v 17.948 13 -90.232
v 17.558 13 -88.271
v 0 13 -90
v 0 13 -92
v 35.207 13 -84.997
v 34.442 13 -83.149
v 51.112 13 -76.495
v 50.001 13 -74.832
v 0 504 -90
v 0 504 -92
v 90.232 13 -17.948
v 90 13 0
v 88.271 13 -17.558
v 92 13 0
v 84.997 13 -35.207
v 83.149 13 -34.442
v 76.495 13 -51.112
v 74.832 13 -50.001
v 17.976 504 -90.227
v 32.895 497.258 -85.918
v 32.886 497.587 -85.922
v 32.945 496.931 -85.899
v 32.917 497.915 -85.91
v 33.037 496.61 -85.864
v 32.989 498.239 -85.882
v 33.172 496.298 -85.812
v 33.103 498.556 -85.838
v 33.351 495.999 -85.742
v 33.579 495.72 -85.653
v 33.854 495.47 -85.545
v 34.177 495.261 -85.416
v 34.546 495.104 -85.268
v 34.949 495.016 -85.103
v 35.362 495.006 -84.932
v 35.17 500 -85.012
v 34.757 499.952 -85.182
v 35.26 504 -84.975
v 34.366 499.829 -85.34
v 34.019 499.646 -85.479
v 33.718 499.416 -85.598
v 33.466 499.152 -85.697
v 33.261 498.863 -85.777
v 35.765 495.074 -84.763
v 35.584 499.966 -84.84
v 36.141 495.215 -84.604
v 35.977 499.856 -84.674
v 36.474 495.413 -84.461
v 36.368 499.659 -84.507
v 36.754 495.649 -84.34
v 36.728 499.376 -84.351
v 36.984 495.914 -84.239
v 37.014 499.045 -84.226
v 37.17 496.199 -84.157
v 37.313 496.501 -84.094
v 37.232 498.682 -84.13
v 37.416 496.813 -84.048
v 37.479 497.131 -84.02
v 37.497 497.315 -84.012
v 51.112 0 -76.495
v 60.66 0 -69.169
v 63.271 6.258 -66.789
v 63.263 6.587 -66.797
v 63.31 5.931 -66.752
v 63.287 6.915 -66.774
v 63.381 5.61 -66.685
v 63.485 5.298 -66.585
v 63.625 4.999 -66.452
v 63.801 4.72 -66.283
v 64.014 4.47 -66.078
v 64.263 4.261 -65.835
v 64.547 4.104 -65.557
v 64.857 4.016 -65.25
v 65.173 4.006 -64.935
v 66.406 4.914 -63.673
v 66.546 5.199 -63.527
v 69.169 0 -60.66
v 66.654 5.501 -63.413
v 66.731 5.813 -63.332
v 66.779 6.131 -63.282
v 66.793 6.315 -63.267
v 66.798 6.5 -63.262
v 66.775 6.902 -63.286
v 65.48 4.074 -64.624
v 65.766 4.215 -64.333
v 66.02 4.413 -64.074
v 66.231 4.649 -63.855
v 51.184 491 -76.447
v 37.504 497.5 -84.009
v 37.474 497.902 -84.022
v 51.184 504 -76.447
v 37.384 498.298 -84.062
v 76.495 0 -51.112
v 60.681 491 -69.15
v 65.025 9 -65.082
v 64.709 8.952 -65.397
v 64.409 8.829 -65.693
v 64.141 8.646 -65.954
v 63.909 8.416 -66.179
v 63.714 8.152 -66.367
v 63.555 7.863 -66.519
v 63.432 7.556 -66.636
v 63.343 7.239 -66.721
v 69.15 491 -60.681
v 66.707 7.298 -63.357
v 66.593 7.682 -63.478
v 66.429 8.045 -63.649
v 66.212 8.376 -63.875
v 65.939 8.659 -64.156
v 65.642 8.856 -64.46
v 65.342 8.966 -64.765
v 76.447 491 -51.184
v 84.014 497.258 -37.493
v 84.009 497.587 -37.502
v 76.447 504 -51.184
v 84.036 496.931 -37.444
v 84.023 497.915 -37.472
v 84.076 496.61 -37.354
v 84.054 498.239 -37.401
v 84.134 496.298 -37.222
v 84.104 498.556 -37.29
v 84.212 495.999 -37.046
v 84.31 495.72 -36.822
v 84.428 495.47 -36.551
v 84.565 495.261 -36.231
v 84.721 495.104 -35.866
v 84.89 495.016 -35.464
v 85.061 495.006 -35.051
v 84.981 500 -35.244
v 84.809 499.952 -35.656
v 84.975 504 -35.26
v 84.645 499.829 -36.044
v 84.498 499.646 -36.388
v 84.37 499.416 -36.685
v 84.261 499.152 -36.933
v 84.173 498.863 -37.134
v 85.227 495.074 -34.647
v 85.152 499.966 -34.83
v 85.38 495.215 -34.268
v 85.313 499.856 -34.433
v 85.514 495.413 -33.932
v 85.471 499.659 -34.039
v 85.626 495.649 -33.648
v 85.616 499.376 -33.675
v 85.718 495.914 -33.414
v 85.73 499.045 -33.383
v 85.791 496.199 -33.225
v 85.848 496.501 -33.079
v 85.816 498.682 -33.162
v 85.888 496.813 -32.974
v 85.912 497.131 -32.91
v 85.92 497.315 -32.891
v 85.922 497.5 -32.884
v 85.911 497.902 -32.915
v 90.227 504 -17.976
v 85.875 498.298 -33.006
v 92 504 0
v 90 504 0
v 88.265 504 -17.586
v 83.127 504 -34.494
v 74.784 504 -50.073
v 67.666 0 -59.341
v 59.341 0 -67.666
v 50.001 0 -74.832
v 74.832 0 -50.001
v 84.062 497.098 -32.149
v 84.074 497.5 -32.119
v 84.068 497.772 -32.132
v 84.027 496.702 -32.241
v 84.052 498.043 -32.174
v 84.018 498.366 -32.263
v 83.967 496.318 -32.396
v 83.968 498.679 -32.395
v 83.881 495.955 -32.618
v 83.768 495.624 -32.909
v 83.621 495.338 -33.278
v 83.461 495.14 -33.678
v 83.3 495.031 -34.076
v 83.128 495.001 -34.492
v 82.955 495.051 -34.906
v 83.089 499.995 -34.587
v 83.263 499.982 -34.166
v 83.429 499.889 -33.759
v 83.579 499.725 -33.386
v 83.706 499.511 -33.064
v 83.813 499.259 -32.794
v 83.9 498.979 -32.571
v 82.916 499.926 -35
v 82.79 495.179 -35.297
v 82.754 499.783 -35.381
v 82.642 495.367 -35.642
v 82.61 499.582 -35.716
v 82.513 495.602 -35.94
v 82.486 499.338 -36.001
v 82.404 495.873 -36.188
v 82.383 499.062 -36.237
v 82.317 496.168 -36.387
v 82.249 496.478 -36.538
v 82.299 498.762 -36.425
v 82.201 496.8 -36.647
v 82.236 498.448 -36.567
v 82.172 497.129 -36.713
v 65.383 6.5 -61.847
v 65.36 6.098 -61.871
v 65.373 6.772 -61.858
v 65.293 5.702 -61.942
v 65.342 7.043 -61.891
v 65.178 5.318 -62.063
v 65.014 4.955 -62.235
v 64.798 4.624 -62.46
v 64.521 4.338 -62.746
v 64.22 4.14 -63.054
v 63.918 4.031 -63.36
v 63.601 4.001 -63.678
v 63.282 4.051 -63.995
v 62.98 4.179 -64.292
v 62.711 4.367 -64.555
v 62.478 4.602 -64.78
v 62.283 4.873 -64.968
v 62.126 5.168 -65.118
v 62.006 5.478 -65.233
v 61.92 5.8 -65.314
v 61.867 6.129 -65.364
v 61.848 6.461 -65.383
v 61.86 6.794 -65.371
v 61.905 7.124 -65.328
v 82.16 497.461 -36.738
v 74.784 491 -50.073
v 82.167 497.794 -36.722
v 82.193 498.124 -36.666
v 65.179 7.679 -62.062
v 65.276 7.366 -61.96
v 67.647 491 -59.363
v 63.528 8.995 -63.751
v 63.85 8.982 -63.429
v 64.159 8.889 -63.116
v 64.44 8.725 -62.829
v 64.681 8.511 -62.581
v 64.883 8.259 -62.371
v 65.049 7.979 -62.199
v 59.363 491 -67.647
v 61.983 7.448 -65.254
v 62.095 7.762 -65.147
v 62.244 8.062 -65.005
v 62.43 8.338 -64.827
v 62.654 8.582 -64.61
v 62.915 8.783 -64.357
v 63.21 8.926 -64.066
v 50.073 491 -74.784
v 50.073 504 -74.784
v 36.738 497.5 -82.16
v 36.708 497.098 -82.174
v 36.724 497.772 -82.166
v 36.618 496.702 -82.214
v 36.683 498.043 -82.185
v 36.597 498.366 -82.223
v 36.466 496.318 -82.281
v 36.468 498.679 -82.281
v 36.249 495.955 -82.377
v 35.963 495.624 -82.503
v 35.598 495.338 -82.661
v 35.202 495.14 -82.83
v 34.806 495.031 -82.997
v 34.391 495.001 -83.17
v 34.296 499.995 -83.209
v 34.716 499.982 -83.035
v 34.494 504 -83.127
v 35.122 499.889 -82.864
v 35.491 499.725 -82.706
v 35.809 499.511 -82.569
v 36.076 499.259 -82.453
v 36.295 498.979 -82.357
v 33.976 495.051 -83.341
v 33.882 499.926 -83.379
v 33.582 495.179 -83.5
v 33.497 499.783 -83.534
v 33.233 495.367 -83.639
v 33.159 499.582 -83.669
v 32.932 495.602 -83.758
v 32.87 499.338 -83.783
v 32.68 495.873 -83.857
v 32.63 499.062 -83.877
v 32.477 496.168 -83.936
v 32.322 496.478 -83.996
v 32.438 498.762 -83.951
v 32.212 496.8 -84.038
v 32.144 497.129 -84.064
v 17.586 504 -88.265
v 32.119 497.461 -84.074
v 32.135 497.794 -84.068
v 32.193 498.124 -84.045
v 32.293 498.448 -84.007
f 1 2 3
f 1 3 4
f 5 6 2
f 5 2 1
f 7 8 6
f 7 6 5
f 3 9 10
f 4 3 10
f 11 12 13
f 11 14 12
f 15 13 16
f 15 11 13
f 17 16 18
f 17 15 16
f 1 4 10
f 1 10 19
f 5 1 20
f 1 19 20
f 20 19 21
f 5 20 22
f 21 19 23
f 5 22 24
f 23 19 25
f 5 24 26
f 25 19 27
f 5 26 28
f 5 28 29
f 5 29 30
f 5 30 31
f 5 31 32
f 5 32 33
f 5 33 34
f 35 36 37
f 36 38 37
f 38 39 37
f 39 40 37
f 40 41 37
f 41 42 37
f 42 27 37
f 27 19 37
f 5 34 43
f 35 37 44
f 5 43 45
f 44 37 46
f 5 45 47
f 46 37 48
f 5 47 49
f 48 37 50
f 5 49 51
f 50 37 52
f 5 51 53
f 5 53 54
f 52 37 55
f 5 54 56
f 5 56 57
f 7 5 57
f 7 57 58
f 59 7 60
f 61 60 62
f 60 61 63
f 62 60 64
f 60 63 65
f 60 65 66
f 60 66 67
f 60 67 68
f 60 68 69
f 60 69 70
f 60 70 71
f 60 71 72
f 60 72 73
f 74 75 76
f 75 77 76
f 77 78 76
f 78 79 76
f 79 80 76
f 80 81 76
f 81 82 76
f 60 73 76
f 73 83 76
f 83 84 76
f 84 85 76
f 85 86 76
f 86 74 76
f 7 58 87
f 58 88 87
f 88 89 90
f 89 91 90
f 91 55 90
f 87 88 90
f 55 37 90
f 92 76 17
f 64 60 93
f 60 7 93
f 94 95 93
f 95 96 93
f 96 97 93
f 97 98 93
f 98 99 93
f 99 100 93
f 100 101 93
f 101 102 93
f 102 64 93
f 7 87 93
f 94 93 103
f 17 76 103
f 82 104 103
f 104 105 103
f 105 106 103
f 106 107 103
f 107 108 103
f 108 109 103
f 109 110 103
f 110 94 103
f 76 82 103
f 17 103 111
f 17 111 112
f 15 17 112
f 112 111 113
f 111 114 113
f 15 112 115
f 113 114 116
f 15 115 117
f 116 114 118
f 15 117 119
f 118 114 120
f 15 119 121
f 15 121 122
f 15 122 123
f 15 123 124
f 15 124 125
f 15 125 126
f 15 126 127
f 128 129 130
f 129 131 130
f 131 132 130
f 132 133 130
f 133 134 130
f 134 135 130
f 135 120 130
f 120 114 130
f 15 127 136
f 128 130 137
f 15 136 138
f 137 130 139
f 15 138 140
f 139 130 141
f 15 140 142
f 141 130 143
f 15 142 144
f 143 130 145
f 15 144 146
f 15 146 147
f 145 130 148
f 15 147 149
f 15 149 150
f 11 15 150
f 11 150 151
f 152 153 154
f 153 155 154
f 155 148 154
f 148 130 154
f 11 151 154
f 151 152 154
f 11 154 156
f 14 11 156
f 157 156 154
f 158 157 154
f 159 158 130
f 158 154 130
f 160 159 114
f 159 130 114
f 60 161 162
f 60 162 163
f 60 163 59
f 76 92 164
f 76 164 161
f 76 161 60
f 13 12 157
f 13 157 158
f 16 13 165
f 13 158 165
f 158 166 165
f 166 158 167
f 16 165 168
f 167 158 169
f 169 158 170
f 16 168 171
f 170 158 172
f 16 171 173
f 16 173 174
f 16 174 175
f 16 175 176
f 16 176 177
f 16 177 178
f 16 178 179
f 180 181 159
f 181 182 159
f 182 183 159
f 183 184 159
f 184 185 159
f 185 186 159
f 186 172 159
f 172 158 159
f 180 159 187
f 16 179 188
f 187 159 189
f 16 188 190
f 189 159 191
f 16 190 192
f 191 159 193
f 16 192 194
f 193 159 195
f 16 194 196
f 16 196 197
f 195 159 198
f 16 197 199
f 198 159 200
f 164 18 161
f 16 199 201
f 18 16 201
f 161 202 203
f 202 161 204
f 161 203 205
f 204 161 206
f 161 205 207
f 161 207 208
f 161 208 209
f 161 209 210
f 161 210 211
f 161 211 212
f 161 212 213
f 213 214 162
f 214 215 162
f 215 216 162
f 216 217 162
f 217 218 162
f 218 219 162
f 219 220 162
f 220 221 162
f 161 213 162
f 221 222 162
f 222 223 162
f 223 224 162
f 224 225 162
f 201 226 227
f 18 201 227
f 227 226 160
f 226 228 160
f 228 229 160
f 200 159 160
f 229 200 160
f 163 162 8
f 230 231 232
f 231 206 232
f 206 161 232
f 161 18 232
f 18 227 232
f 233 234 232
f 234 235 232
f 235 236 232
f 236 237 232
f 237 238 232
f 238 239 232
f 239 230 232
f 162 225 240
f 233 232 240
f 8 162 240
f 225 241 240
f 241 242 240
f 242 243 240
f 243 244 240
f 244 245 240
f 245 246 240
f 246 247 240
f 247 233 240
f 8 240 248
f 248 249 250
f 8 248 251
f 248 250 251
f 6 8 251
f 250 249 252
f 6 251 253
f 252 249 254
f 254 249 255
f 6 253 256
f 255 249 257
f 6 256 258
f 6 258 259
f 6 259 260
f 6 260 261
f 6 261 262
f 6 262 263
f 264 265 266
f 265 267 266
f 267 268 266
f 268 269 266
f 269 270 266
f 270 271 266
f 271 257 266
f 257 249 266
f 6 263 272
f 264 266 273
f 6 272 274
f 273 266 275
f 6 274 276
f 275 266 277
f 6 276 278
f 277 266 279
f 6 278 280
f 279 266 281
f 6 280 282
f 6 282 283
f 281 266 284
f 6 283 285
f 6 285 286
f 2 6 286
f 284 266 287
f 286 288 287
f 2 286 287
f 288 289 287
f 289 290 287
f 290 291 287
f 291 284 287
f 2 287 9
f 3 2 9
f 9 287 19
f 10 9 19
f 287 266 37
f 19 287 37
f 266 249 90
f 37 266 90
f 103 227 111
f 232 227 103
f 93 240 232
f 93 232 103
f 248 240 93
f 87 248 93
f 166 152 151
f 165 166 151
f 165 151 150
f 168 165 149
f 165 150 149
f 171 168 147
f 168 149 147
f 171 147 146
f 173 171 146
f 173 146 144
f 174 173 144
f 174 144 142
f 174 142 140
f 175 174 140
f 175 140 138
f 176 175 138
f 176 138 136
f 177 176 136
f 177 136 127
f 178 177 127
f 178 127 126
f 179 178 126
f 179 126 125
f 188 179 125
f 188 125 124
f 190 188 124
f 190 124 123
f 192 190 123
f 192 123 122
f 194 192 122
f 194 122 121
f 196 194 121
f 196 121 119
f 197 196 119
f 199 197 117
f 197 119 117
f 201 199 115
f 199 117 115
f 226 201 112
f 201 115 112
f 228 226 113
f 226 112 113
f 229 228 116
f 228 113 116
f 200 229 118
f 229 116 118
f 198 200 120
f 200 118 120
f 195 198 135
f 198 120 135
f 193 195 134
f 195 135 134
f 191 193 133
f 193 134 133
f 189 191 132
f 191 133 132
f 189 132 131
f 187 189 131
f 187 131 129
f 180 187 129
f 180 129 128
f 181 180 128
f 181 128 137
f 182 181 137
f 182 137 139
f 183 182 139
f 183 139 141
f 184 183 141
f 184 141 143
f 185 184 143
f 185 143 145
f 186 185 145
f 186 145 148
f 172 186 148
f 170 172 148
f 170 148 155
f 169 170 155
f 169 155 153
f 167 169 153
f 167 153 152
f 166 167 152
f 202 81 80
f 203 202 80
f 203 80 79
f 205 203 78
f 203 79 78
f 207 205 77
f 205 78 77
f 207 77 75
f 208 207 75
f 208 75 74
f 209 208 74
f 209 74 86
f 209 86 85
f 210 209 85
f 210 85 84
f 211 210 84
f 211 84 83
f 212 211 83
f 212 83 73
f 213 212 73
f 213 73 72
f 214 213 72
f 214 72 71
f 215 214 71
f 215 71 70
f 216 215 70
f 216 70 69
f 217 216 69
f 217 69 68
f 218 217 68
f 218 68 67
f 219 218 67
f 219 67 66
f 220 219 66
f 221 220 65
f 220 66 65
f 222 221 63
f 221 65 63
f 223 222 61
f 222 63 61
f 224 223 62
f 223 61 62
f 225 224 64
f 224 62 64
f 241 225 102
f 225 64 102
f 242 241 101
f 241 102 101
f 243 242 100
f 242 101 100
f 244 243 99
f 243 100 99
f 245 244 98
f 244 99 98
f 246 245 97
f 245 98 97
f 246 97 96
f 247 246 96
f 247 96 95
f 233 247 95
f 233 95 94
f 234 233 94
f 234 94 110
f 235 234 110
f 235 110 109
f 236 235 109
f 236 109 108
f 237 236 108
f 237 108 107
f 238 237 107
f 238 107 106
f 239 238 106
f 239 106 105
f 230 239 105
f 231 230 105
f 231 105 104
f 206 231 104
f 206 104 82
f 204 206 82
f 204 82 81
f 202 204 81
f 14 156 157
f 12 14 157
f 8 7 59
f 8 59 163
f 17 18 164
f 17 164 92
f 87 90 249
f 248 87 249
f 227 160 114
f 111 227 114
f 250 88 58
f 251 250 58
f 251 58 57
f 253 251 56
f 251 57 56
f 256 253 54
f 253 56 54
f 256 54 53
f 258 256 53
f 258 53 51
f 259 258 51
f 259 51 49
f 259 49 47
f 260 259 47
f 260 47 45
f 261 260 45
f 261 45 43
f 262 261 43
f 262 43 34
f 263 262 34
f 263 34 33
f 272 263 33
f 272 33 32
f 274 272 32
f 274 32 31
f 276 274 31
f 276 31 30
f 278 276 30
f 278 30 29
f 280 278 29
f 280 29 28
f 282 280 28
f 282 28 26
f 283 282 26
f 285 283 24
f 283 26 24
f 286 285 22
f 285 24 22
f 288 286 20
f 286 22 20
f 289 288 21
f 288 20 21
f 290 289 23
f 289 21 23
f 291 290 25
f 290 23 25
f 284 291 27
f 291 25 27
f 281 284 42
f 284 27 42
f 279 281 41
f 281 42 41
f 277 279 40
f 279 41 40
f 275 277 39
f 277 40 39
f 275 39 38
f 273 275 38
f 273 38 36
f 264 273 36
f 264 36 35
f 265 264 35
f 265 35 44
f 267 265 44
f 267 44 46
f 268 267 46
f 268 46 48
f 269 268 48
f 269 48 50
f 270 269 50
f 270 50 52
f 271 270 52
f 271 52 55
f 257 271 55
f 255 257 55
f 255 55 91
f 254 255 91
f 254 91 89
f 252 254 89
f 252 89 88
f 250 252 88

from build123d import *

# Parameters (mm, degrees)
BOSS_EXTRUDE1_DEPTH     = 504
CUT_EXTRUDE4_REACH      = 514.328
CUT_EXTRUDE4_END_RADIUS = 90
SKETCH6_R               = 2.5
CUT_EXTRUDE2_REACH      = 516.263
CUT_EXTRUDE2_END_RADIUS = 90
SKETCH3_R               = 2.5
CUT_EXTRUDE3_REACH      = 516.263
CUT_EXTRUDE3_END_RADIUS = 90
SKETCH5_R               = 2.5
LPATTERN2_COUNT         = 2
LPATTERN2_PITCH         = 491
CUT_EXTRUDE5_DEPTH      = 13
CUT_EXTRUDE6_START      = -13
CUT_EXTRUDE6_DEPTH      = 13
BODY_MOVE_COPY1_ANGLE   = 180


with BuildPart() as part:
    # Sketch1 → Boss-Extrude1 (new body)
    with BuildSketch(Plane(origin=(0, 0, 0), x_dir=(1, 0, 0), z_dir=(0, 1, 0))):
        with BuildLine():
            Line((0, 92), (0, 90))
            ThreePointArc((0, 90), (63.639610307, 63.639610307), (90, 0))
            Line((90, 0), (92, 0))
            ThreePointArc((92, 0), (65.053823869, 65.053823869), (0, 92))
        make_face()
    extrude(amount=BOSS_EXTRUDE1_DEPTH)

    # Cut-Extrude4: up to this cylinder (the profile starts outside it)
    cut_extrude4_end = Plane(origin=(0, 6.5, 0), z_dir=(0, -1, 0)) * Cylinder(CUT_EXTRUDE4_END_RADIUS, 1209.656, mode=Mode.PRIVATE)
    # Sketch6 → Cut-Extrude4 (cut, up to the surface)
    with BuildSketch(Plane(origin=(65.053823869, 0, -65.053823869), x_dir=(-0.7071067811865486, 0, -0.7071067811865465), z_dir=(0.7071067811865465, 0, -0.7071067811865486)), mode=Mode.PRIVATE) as cut_extrude4_sk1:
        with Locations((0, 6.5)):
            Circle(SKETCH6_R)
    cut_extrude4_tool1 = extrude(cut_extrude4_sk1.sketch, amount=-CUT_EXTRUDE4_REACH, mode=Mode.PRIVATE) - cut_extrude4_end
    cut_extrude4 = cut_extrude4_tool1.solids().sort_by_distance((65.053824, 6.5, -65.053824))[0]
    add(cut_extrude4, mode=Mode.SUBTRACT)

    # Cut-Extrude2: up to this cylinder (the profile starts outside it)
    cut_extrude2_end = Plane(origin=(0, 6.5, 0), z_dir=(0, -1, 0)) * Cylinder(CUT_EXTRUDE2_END_RADIUS, 1213.526, mode=Mode.PRIVATE)
    # Sketch3 → Cut-Extrude2 (cut, up to the surface)
    with BuildSketch(Plane(origin=(84.996916991, 0, -35.206875778), x_dir=(-0.38268343236509045, 0, -0.9238795325112865), z_dir=(0.9238795325112865, 0, -0.38268343236509045)), mode=Mode.PRIVATE) as cut_extrude2_sk1:
        with Locations((0, 6.5)):
            Circle(SKETCH3_R)
    cut_extrude2_tool1 = extrude(cut_extrude2_sk1.sketch, amount=-CUT_EXTRUDE2_REACH, mode=Mode.PRIVATE) - cut_extrude2_end
    cut_extrude2 = cut_extrude2_tool1.solids().sort_by_distance((84.996917, 6.5, -35.206876))[0]
    add(cut_extrude2, mode=Mode.SUBTRACT)

    # Cut-Extrude3: up to this cylinder (the profile starts outside it)
    cut_extrude3_end = Plane(origin=(0, 6.5, 0), z_dir=(0, -1, 0)) * Cylinder(CUT_EXTRUDE3_END_RADIUS, 1213.526, mode=Mode.PRIVATE)
    # Sketch5 → Cut-Extrude3 (cut, up to the surface)
    with BuildSketch(Plane(origin=(35.206875778, 0, -84.996916991), x_dir=(-0.9238795325112878, 0, -0.3826834323650876), z_dir=(0.3826834323650876, 0, -0.9238795325112878)), mode=Mode.PRIVATE) as cut_extrude3_sk1:
        with Locations((0, 6.5)):
            Circle(SKETCH5_R)
    cut_extrude3_tool1 = extrude(cut_extrude3_sk1.sketch, amount=-CUT_EXTRUDE3_REACH, mode=Mode.PRIVATE) - cut_extrude3_end
    cut_extrude3 = cut_extrude3_tool1.solids().sort_by_distance((35.206876, 6.5, -84.996917))[0]
    add(cut_extrude3, mode=Mode.SUBTRACT)

    # LPattern2: Cut-Extrude4, Cut-Extrude2, Cut-Extrude3 ×2
    with Locations(*[(0, i * LPATTERN2_PITCH, 0) for i in range(1, LPATTERN2_COUNT)]):
        add(cut_extrude4, mode=Mode.SUBTRACT)
        add(cut_extrude2, mode=Mode.SUBTRACT)
        add(cut_extrude3, mode=Mode.SUBTRACT)

    # Sketch7 → Cut-Extrude5 (cut)
    with BuildSketch(Plane.XZ):
        with BuildLine():
            Line((76.447375943, -51.183969281), (74.784435976, -50.072828318))
            ThreePointArc((74.784435976, -50.072828318), (63.639610307, -63.639610307), (50.072828318, -74.784435976))
            Line((50.072828318, -74.784435976), (51.183969281, -76.447375943))
            ThreePointArc((51.183969281, -76.447375943), (65.053823869, -65.053823869), (76.447375943, -51.183969281))
        make_face()
    extrude(amount=-CUT_EXTRUDE5_DEPTH, mode=Mode.SUBTRACT)

    # Sketch9 → Cut-Extrude6 (cut)
    with BuildSketch(Plane(origin=(0, 504, 0), x_dir=(1, 0, 0), z_dir=(0, 1, 0)).offset(CUT_EXTRUDE6_START)):
        with BuildLine():
            ThreePointArc((0, 90), (26.125620953, 86.124630216), (50.001320972, 74.832265107))
            Line((50.001320972, 74.832265107), (51.112461438, 76.495204332))
            ThreePointArc((51.112461438, 76.495204332), (26.706190307, 88.038510887), (0, 92))
            Line((0, 92), (0, 90))
        make_face()
        with BuildLine():
            ThreePointArc((74.832265107, 50.001320972), (86.124630216, 26.125620953), (90, 0))
            Line((90, 0), (92, 0))
            ThreePointArc((92, 0), (88.038510887, 26.706190307), (76.495204332, 51.112461438))
            Line((76.495204332, 51.112461438), (74.832265107, 50.001320972))
        make_face()
    extrude(amount=CUT_EXTRUDE6_DEPTH, mode=Mode.SUBTRACT)


with BuildPart() as part_1:
    # Body-Move/Copy1: moved
    add(part.part.moved(Location((0, 0, 0))).rotate(Axis((0, 252, 0), (0.7071067811865488, -4.937700262164522e-15, -0.7071067811865462)), BODY_MOVE_COPY1_ANGLE))


solid = part_1.part
